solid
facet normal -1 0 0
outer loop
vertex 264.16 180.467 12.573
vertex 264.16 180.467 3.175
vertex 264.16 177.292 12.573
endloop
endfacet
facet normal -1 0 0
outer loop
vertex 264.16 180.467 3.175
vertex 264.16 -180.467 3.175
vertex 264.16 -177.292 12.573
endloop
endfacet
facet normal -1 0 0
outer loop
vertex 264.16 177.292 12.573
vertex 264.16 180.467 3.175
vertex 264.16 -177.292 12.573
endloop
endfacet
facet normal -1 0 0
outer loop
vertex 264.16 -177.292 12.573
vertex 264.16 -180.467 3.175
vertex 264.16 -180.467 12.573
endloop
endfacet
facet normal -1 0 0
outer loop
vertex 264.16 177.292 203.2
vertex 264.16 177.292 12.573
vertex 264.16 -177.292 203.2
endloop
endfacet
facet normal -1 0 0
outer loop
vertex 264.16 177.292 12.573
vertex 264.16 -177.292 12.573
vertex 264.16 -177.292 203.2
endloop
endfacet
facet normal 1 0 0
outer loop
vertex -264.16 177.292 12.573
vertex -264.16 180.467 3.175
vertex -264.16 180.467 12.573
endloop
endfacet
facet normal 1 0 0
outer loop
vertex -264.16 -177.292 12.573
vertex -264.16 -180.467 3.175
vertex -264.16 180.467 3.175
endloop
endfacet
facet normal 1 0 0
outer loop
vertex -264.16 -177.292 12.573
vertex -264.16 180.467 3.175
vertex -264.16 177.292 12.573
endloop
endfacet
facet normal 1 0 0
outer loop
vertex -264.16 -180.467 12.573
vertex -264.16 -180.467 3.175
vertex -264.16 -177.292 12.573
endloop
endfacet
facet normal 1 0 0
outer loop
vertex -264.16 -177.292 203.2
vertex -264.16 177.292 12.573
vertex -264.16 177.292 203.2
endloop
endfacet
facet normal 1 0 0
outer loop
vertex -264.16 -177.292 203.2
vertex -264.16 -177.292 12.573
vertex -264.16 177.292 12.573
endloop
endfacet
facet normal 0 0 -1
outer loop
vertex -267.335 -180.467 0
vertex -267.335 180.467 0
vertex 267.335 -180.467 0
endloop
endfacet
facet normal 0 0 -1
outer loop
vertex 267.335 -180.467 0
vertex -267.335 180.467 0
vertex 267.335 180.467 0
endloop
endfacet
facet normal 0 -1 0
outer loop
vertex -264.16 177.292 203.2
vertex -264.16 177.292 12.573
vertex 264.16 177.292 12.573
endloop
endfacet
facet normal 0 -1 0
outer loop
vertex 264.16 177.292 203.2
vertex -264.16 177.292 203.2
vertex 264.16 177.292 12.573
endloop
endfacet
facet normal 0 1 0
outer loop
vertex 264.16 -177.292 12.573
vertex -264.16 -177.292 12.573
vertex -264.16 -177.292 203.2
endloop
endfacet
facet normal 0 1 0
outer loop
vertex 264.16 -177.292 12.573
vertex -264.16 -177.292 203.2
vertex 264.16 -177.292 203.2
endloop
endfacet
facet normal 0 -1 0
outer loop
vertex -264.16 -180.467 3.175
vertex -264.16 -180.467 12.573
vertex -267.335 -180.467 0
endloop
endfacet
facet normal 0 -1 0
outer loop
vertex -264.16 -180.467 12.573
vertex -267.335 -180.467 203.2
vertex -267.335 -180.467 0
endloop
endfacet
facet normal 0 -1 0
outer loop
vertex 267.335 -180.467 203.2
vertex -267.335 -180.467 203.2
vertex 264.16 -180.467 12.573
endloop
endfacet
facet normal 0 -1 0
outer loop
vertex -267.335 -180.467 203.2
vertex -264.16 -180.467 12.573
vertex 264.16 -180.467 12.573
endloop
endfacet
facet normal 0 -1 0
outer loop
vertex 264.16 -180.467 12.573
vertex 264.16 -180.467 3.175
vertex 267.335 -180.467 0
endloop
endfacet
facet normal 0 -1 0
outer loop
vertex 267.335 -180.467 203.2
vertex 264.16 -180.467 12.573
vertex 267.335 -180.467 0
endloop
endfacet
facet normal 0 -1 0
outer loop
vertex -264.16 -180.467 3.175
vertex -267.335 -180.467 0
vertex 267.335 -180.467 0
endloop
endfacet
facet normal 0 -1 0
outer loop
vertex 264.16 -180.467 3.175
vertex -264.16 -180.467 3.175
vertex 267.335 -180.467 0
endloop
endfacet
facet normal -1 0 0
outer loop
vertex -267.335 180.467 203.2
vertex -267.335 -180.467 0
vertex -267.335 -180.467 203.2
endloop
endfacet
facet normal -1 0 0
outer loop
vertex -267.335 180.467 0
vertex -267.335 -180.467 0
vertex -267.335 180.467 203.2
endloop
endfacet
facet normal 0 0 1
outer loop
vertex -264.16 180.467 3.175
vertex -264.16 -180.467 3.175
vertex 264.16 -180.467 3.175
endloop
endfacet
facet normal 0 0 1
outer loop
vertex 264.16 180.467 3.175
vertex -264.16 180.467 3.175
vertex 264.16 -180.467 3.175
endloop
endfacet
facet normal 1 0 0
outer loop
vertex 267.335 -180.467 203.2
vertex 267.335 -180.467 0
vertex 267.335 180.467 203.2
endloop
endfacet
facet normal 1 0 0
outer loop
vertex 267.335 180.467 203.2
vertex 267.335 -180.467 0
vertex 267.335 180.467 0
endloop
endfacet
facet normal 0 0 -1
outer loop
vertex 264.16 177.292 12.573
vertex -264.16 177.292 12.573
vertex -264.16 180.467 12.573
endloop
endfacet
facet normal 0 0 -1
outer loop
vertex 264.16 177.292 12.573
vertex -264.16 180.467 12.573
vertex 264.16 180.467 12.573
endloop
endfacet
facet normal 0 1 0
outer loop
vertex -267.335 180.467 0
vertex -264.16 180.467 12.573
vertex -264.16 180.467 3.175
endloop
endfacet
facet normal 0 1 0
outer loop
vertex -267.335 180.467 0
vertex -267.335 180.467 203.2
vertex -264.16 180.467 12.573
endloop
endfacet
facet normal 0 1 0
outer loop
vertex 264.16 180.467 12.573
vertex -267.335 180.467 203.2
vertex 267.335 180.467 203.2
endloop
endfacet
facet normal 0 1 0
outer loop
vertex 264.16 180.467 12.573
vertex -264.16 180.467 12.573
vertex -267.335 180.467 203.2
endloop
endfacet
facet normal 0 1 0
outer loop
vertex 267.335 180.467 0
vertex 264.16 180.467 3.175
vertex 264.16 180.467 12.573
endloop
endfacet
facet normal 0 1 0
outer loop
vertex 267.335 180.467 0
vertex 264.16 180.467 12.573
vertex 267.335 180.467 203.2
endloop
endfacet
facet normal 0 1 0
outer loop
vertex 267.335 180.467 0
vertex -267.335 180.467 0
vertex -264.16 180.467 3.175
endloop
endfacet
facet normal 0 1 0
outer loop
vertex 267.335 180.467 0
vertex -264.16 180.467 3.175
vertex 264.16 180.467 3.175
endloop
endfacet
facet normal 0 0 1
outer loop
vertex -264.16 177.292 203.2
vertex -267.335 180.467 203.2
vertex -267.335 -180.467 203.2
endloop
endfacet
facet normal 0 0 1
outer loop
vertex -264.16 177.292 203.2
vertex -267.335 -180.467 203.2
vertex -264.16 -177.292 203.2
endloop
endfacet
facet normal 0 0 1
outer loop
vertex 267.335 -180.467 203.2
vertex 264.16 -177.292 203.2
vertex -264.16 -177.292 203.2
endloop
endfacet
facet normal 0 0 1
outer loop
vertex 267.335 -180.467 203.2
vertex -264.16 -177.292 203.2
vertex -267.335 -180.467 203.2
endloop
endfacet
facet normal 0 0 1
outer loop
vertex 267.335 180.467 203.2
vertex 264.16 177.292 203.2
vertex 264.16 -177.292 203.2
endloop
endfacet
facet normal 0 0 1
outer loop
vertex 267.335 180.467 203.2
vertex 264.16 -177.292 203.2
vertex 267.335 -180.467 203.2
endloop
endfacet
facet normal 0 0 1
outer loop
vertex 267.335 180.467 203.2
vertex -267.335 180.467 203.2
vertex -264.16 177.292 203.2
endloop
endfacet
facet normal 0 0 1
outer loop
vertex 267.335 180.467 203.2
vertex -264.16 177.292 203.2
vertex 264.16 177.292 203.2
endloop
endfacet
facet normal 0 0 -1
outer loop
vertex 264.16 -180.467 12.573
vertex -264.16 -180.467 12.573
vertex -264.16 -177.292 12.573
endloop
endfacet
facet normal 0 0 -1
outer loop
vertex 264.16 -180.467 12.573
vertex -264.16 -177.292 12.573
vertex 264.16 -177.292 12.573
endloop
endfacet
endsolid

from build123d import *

# Parameters (mm, degrees)
SKETCH1_W           = 534.67
SKETCH1_H           = 360.934
SKETCH1_W_2         = 528.32
SKETCH1_H_2         = 354.584
BOSS_EXTRUDE1_DEPTH = 203.2
SHELL1_T            = -3.175
SKETCH2_W           = 528.32
SKETCH2_H           = 9.398
CUT_EXTRUDE1_DEPTH  = 493.982347129


with BuildPart() as part:
    # Sketch1 → Boss-Extrude1 (new body)
    # profile 1 of 2: a face of its own
    with BuildSketch(Plane.XY):
        Rectangle(SKETCH1_W, SKETCH1_H)
        Rectangle(SKETCH1_W_2, SKETCH1_H_2, mode=Mode.SUBTRACT)
    # profile 2 of 2: a face of its own
    with BuildSketch(Plane.XY):
        Rectangle(SKETCH1_W_2, SKETCH1_H_2)
    extrude(amount=BOSS_EXTRUDE1_DEPTH)

    # Shell1
    shell1_openings = [part.faces().sort_by_distance(p)[0] for p in [
        (0, 0, 203.2),
    ]]
    offset(amount=SHELL1_T, openings=shell1_openings, kind=Kind.INTERSECTION)

    # Sketch2 → Cut-Extrude1 (cut, through all)
    with BuildSketch(Plane.XZ.offset(180.467)):
        with Locations((0, 7.874)):
            Rectangle(SKETCH2_W, SKETCH2_H)
    extrude(amount=-CUT_EXTRUDE1_DEPTH, mode=Mode.SUBTRACT)


solid = part.part
